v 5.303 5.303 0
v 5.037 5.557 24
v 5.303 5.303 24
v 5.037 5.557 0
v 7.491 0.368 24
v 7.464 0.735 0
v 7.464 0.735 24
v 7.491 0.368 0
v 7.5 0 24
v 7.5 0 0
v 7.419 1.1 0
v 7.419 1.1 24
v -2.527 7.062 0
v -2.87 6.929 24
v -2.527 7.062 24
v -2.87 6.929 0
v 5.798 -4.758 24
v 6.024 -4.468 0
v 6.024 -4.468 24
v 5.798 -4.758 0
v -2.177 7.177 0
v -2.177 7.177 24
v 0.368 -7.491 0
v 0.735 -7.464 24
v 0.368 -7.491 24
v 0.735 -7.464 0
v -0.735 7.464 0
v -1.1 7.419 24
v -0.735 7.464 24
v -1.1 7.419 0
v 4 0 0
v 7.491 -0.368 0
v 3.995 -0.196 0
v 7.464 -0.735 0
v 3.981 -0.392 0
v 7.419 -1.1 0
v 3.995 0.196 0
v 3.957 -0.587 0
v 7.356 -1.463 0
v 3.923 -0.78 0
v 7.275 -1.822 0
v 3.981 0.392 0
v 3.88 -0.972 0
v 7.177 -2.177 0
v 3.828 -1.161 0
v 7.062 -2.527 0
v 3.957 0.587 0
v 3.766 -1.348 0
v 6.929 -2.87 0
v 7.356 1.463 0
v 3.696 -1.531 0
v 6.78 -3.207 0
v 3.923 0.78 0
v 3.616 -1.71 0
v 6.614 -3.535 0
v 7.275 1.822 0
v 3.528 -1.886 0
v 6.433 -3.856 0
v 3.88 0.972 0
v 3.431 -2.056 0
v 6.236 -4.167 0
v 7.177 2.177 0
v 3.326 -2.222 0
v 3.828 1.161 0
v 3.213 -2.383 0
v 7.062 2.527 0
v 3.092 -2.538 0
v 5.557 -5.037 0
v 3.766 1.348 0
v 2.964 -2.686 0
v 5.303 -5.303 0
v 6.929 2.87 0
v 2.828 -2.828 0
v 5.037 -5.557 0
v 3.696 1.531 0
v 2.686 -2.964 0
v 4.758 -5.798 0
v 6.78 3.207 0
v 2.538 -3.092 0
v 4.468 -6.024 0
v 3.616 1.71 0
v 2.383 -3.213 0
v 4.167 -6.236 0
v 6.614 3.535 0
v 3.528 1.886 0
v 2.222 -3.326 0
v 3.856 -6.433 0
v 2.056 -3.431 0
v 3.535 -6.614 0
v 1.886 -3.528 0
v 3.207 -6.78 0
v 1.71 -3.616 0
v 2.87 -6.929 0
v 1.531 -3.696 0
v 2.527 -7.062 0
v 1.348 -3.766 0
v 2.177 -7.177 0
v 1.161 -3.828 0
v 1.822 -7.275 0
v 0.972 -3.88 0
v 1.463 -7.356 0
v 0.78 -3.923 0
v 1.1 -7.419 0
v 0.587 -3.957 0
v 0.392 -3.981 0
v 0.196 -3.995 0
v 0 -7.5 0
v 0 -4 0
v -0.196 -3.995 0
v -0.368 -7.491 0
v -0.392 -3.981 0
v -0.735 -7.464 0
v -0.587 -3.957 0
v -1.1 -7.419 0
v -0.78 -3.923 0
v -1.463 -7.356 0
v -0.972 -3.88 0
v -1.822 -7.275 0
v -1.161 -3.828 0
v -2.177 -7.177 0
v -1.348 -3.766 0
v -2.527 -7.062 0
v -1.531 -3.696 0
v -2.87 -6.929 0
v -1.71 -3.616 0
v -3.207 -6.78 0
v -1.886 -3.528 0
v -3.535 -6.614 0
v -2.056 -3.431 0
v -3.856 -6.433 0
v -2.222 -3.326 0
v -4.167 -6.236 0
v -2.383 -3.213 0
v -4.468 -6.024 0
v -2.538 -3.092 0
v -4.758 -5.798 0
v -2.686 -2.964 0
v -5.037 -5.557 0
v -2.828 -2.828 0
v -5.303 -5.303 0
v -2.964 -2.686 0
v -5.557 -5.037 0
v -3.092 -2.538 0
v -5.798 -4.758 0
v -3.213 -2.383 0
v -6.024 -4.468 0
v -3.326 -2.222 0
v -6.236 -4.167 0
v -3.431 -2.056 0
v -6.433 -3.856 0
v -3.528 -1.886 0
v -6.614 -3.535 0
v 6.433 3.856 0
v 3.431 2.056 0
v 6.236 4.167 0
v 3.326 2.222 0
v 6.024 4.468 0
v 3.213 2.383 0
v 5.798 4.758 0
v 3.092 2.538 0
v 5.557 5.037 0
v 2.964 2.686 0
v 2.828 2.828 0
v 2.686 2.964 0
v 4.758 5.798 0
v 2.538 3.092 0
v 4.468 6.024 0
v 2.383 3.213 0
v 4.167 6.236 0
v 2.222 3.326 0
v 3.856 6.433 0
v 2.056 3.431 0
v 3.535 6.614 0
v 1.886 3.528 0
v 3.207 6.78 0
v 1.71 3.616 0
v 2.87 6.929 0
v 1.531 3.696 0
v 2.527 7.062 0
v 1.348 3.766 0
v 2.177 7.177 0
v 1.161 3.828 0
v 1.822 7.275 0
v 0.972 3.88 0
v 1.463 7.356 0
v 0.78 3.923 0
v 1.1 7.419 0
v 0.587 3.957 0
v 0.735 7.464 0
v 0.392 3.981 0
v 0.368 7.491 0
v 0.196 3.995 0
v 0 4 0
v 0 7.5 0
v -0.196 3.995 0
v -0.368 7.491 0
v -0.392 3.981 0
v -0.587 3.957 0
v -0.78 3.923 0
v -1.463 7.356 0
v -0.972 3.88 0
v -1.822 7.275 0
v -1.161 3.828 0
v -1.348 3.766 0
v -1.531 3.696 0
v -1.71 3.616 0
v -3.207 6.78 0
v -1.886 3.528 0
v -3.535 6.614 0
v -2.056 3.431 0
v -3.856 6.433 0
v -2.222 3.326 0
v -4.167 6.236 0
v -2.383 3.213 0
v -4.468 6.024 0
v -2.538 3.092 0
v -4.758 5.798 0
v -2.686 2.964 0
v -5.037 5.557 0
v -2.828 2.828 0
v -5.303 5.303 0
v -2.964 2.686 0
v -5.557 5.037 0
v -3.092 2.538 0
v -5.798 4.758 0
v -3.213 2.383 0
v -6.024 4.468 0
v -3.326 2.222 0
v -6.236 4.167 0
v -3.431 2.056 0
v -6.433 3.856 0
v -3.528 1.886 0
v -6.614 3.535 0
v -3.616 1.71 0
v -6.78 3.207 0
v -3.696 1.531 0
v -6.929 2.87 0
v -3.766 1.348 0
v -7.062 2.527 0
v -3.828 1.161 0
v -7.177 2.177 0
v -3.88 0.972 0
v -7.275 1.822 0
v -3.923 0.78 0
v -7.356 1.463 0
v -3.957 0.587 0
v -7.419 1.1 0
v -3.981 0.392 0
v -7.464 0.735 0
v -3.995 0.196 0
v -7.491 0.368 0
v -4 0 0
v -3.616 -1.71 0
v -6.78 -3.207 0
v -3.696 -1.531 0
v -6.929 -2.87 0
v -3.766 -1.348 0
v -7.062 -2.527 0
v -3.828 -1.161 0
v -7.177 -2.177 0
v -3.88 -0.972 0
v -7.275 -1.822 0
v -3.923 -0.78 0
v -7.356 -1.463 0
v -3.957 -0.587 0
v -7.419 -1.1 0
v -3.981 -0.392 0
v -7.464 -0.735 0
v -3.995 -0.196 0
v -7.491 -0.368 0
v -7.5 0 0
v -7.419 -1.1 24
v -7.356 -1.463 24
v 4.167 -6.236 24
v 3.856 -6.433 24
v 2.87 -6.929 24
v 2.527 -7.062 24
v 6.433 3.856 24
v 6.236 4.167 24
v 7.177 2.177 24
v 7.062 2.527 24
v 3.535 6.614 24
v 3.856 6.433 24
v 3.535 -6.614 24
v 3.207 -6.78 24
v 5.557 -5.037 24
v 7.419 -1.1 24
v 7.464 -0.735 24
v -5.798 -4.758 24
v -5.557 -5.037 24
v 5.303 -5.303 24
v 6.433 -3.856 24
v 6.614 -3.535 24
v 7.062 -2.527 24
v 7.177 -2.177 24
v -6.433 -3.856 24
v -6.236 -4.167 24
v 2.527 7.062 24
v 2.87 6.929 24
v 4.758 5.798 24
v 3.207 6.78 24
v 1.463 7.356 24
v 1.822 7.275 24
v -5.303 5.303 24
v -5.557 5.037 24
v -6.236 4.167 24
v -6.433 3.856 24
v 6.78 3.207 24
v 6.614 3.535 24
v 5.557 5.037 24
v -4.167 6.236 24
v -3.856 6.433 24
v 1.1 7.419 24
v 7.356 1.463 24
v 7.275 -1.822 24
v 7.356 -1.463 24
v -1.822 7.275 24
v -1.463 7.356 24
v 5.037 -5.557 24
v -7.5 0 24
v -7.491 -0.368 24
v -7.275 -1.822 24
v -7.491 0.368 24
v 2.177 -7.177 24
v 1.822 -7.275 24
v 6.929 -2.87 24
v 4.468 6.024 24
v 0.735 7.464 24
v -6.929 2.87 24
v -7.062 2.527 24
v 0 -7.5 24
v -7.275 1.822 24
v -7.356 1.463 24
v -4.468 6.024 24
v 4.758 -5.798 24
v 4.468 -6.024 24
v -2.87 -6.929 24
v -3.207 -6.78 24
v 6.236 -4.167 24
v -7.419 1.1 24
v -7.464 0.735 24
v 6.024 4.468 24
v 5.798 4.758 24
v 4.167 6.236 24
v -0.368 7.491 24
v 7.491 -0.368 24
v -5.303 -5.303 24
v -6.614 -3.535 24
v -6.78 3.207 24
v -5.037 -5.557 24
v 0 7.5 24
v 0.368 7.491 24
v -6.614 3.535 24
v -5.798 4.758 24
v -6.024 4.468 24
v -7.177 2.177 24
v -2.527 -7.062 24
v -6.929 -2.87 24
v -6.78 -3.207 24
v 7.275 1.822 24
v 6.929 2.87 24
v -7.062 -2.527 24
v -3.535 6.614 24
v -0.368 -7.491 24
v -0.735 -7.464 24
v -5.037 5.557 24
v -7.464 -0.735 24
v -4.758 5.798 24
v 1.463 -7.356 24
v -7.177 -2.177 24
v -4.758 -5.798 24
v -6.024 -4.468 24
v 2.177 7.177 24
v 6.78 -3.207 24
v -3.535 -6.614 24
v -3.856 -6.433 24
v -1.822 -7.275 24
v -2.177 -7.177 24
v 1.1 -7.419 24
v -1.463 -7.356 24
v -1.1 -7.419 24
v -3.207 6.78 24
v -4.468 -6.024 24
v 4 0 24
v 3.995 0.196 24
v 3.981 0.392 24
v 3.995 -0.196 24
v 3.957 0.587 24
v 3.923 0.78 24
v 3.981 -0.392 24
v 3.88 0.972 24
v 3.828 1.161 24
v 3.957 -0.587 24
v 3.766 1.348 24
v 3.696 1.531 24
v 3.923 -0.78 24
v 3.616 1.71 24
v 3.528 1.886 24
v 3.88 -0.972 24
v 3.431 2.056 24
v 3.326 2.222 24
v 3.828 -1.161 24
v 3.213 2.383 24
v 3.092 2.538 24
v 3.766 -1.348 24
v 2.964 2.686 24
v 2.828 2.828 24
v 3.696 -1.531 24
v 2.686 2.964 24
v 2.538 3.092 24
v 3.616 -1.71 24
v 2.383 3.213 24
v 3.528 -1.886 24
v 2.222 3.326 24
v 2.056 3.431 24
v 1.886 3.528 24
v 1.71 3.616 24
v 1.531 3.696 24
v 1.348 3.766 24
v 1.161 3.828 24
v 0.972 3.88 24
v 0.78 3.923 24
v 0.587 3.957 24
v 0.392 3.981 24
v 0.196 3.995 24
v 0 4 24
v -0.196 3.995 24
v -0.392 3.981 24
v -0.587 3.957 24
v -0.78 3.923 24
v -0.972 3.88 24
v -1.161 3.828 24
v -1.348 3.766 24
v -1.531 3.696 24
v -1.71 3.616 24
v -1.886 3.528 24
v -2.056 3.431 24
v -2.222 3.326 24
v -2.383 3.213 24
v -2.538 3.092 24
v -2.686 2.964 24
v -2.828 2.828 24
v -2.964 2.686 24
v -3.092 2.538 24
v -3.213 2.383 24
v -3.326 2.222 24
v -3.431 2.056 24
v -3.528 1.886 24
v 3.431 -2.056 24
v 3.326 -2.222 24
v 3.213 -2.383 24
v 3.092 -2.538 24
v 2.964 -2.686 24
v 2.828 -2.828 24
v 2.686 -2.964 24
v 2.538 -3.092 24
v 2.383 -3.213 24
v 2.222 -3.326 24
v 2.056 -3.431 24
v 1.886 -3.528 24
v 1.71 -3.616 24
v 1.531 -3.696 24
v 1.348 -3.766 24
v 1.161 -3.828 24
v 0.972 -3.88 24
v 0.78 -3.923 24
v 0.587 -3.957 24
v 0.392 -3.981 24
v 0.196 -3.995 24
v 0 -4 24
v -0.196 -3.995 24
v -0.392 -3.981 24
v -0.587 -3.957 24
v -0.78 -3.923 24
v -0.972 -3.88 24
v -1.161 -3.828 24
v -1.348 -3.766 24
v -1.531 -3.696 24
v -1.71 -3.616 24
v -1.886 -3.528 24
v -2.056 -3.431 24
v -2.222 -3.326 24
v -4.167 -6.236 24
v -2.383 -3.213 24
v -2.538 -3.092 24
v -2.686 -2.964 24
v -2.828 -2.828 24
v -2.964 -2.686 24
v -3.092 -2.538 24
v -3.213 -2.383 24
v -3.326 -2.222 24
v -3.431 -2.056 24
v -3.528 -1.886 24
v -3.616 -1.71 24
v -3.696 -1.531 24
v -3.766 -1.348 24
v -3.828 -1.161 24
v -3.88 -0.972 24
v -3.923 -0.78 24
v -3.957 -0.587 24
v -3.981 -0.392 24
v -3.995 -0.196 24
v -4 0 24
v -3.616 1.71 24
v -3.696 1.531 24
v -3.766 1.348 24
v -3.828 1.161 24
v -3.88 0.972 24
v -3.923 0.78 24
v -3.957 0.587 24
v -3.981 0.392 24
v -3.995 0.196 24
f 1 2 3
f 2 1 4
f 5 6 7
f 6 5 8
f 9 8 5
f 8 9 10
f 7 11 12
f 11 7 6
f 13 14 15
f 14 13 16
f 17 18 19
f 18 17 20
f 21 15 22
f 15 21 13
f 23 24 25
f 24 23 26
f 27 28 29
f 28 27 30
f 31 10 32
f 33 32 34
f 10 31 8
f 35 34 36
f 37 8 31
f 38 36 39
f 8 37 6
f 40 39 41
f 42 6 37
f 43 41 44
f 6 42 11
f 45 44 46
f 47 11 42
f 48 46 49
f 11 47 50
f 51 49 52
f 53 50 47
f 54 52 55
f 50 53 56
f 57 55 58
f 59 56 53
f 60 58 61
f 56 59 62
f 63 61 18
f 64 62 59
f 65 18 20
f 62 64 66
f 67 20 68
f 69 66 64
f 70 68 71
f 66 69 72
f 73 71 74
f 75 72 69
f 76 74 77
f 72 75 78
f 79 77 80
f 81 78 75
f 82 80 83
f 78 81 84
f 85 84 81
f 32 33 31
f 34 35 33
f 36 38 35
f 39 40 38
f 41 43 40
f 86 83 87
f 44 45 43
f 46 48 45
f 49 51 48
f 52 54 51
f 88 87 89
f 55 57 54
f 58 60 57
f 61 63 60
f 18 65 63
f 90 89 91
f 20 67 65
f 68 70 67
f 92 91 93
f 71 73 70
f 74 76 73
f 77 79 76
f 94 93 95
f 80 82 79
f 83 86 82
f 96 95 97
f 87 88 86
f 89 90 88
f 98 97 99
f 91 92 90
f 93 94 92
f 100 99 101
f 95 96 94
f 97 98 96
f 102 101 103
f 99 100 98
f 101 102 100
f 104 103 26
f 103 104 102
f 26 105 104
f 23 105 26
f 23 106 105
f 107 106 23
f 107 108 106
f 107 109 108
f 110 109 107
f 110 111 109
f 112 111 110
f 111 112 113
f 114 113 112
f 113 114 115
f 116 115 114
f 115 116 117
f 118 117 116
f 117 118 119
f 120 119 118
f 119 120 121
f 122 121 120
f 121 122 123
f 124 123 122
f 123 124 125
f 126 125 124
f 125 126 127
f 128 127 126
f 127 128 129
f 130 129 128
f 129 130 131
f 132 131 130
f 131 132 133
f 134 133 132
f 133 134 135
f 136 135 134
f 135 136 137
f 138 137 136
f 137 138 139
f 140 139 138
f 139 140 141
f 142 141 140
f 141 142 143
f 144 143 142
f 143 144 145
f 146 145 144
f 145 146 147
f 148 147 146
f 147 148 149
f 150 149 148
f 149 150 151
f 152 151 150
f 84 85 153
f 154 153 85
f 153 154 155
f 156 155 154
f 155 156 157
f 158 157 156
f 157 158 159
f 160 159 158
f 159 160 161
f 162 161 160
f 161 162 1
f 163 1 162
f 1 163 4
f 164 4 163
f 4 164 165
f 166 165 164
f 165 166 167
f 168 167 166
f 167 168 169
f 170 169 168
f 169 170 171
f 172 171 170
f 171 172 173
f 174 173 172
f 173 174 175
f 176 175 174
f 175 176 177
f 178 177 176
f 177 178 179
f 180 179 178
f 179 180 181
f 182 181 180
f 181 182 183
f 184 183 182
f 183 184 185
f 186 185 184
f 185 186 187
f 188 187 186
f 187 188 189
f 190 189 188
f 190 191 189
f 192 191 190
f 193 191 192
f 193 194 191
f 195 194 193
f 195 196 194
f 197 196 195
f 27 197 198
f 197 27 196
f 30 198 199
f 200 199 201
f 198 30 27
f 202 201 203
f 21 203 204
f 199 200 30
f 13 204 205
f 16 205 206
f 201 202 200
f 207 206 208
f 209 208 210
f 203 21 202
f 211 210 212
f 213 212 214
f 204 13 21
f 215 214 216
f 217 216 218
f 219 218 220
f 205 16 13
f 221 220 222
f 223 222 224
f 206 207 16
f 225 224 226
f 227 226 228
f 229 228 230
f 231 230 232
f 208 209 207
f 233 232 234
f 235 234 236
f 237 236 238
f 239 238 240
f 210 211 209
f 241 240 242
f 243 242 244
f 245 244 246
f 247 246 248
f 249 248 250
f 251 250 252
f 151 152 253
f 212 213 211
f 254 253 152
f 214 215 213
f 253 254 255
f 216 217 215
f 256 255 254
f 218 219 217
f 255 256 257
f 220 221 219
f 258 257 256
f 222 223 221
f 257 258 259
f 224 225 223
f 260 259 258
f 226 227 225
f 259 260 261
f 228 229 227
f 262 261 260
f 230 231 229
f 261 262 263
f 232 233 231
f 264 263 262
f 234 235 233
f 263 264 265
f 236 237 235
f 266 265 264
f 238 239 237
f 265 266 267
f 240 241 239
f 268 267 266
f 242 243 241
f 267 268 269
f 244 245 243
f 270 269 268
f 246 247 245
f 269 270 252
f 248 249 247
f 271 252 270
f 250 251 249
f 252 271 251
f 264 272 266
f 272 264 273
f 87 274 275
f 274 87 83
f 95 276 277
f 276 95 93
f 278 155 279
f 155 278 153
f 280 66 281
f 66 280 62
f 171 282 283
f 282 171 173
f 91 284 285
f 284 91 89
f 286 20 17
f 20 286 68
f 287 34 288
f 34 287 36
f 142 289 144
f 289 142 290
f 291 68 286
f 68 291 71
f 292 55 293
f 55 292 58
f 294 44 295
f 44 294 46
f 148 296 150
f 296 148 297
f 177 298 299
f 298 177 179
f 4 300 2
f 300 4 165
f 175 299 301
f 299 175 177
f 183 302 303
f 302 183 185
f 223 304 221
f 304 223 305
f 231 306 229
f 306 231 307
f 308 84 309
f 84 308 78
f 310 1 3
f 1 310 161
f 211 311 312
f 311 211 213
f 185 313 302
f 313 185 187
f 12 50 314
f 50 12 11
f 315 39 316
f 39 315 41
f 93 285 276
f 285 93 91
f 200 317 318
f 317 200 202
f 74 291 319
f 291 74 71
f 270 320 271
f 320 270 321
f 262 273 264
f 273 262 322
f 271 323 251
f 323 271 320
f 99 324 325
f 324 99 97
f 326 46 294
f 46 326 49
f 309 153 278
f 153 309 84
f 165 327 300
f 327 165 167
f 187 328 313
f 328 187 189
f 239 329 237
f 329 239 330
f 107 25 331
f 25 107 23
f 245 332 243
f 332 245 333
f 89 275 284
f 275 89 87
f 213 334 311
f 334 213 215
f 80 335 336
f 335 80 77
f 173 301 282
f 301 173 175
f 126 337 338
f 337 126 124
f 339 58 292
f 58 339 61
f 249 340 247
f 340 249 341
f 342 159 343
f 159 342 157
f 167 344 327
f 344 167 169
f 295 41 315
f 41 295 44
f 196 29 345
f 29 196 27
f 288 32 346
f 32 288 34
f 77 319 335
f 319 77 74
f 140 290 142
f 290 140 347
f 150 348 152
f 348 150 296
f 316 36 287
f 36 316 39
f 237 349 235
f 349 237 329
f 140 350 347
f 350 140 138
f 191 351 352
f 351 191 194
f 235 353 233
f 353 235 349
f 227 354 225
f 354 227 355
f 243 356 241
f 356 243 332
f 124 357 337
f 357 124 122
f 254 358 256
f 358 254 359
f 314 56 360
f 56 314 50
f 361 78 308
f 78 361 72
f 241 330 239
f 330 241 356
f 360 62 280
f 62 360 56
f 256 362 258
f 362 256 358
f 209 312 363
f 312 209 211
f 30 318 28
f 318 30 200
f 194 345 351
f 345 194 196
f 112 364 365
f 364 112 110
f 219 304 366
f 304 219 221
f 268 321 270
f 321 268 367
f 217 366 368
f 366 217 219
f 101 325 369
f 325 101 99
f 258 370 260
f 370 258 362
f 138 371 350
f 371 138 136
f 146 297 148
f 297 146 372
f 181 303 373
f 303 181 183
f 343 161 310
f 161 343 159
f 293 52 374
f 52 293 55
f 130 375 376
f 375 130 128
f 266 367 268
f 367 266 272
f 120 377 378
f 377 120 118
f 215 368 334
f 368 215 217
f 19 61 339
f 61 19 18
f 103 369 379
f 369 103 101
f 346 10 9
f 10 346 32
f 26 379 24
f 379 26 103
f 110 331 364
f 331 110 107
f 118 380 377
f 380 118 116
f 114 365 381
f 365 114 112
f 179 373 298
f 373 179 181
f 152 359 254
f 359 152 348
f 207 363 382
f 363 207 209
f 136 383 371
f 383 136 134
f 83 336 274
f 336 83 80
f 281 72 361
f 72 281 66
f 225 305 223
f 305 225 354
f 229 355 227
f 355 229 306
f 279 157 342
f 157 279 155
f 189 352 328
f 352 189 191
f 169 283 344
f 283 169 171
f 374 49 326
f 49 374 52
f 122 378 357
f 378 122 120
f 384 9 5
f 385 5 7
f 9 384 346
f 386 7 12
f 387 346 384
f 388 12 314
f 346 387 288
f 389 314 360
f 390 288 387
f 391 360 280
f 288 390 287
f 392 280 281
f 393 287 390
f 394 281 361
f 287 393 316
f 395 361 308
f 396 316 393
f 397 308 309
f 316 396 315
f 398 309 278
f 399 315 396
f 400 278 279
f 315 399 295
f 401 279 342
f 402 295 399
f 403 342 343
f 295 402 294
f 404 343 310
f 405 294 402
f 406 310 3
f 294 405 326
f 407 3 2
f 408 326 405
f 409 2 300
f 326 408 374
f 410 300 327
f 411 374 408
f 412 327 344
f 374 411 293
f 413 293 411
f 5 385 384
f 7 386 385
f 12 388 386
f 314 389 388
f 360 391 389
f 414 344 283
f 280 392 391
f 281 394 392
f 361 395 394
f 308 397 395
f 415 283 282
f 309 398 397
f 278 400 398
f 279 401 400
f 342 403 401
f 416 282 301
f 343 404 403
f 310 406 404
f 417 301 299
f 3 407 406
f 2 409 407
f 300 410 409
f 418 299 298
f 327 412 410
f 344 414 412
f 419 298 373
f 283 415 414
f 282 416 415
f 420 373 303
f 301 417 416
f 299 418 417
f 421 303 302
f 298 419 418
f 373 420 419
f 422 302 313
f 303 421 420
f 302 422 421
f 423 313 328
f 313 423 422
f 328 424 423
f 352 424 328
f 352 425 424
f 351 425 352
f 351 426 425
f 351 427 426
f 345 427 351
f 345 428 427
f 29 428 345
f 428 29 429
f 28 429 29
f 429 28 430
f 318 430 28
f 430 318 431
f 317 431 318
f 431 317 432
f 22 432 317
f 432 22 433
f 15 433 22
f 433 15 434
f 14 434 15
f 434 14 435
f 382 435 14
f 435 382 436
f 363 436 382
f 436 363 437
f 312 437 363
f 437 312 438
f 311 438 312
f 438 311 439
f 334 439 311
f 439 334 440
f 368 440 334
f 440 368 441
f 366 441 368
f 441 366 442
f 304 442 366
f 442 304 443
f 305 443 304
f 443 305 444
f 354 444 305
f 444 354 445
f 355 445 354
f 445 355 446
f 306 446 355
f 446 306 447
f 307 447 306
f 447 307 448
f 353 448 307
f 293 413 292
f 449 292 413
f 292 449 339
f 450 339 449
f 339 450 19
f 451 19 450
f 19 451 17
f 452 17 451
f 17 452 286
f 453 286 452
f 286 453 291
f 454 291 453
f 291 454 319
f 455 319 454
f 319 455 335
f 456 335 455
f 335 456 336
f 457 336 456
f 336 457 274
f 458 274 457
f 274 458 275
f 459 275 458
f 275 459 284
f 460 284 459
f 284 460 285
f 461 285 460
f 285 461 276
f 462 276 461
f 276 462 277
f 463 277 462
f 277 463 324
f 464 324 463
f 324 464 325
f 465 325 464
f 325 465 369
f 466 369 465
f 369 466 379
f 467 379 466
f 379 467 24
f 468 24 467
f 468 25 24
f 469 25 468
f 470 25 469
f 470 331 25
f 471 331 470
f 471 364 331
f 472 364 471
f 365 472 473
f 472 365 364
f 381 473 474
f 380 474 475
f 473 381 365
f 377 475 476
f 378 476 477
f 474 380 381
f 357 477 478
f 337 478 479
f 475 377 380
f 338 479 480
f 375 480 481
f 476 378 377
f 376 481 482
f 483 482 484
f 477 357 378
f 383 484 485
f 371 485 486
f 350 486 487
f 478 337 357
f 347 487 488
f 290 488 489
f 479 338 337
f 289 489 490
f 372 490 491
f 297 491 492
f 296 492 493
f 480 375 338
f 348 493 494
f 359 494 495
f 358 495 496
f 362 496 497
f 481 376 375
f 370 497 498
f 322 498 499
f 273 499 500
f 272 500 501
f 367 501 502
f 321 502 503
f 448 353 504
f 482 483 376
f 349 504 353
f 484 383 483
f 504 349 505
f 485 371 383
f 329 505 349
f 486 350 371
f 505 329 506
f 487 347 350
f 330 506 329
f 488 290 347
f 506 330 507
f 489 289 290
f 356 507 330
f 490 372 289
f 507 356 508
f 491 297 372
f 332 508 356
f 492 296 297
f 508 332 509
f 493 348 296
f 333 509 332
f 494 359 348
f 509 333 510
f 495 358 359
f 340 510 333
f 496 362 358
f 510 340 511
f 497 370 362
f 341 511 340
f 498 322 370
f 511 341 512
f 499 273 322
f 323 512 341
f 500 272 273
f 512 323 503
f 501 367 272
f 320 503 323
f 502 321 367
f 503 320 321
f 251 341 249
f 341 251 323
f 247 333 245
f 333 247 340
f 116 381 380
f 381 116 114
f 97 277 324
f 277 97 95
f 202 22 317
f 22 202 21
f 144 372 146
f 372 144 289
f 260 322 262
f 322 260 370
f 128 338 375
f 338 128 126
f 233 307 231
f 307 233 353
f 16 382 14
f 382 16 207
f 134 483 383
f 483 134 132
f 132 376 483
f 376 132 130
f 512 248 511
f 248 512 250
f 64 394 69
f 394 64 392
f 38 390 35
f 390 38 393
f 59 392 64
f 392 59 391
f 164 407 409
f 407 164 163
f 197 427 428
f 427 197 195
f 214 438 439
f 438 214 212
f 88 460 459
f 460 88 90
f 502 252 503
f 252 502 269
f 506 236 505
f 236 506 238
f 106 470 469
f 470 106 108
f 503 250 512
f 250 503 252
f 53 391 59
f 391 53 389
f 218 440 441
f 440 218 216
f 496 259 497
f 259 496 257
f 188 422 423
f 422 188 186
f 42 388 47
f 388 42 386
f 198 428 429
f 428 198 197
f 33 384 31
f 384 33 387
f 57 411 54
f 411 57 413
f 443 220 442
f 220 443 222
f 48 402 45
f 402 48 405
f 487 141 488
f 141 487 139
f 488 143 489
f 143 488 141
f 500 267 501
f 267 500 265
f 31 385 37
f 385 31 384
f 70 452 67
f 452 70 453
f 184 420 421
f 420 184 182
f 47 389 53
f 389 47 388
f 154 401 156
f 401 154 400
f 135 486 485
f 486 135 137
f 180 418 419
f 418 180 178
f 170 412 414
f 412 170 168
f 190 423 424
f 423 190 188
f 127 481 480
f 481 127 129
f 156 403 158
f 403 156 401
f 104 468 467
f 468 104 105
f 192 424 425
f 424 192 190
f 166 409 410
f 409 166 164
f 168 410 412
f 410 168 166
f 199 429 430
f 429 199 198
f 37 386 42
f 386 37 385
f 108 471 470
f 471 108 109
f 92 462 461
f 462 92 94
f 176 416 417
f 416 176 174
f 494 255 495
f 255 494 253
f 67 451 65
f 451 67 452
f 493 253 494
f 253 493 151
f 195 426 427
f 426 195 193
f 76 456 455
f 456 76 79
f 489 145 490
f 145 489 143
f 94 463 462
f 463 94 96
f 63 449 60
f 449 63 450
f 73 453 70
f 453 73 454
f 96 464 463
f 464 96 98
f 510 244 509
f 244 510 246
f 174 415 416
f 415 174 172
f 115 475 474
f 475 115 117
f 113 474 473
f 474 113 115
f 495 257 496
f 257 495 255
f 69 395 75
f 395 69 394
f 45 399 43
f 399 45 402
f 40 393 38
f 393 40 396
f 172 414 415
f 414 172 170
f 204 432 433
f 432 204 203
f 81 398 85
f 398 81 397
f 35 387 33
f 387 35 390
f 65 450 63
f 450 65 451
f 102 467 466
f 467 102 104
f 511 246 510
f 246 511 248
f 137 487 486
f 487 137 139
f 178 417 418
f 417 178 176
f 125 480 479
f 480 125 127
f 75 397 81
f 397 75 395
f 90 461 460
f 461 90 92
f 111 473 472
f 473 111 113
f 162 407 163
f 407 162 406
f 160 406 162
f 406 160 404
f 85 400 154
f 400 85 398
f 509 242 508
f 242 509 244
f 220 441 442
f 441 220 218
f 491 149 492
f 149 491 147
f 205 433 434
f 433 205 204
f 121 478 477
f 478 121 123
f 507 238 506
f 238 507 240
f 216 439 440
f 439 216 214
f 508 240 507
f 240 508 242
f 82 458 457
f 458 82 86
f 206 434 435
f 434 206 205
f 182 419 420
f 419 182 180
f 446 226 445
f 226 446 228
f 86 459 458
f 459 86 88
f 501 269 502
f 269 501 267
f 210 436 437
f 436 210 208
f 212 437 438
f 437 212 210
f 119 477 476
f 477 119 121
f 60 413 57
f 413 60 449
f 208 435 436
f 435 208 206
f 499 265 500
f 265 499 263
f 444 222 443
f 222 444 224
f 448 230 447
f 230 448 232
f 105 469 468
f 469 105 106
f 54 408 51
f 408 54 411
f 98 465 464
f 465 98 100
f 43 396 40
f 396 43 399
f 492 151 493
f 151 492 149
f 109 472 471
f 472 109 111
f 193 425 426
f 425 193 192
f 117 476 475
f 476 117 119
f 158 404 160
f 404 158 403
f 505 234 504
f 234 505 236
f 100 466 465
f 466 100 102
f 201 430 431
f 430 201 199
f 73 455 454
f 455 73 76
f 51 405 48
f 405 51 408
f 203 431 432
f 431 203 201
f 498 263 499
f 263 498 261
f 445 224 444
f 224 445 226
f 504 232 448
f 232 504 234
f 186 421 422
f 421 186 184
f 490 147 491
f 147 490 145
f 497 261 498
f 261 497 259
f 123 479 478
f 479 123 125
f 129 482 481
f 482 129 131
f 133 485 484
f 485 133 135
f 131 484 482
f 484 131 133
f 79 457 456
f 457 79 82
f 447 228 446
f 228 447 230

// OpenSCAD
$fn = 128;

bore_d = 8.0;
od_d   = 15.0;
len    = 24.0;

difference() {
  cylinder(d = od_d, h = len, center = false);
  translate([0,0,-0.1]) cylinder(d = bore_d, h = len + 0.2, center = false);
}
